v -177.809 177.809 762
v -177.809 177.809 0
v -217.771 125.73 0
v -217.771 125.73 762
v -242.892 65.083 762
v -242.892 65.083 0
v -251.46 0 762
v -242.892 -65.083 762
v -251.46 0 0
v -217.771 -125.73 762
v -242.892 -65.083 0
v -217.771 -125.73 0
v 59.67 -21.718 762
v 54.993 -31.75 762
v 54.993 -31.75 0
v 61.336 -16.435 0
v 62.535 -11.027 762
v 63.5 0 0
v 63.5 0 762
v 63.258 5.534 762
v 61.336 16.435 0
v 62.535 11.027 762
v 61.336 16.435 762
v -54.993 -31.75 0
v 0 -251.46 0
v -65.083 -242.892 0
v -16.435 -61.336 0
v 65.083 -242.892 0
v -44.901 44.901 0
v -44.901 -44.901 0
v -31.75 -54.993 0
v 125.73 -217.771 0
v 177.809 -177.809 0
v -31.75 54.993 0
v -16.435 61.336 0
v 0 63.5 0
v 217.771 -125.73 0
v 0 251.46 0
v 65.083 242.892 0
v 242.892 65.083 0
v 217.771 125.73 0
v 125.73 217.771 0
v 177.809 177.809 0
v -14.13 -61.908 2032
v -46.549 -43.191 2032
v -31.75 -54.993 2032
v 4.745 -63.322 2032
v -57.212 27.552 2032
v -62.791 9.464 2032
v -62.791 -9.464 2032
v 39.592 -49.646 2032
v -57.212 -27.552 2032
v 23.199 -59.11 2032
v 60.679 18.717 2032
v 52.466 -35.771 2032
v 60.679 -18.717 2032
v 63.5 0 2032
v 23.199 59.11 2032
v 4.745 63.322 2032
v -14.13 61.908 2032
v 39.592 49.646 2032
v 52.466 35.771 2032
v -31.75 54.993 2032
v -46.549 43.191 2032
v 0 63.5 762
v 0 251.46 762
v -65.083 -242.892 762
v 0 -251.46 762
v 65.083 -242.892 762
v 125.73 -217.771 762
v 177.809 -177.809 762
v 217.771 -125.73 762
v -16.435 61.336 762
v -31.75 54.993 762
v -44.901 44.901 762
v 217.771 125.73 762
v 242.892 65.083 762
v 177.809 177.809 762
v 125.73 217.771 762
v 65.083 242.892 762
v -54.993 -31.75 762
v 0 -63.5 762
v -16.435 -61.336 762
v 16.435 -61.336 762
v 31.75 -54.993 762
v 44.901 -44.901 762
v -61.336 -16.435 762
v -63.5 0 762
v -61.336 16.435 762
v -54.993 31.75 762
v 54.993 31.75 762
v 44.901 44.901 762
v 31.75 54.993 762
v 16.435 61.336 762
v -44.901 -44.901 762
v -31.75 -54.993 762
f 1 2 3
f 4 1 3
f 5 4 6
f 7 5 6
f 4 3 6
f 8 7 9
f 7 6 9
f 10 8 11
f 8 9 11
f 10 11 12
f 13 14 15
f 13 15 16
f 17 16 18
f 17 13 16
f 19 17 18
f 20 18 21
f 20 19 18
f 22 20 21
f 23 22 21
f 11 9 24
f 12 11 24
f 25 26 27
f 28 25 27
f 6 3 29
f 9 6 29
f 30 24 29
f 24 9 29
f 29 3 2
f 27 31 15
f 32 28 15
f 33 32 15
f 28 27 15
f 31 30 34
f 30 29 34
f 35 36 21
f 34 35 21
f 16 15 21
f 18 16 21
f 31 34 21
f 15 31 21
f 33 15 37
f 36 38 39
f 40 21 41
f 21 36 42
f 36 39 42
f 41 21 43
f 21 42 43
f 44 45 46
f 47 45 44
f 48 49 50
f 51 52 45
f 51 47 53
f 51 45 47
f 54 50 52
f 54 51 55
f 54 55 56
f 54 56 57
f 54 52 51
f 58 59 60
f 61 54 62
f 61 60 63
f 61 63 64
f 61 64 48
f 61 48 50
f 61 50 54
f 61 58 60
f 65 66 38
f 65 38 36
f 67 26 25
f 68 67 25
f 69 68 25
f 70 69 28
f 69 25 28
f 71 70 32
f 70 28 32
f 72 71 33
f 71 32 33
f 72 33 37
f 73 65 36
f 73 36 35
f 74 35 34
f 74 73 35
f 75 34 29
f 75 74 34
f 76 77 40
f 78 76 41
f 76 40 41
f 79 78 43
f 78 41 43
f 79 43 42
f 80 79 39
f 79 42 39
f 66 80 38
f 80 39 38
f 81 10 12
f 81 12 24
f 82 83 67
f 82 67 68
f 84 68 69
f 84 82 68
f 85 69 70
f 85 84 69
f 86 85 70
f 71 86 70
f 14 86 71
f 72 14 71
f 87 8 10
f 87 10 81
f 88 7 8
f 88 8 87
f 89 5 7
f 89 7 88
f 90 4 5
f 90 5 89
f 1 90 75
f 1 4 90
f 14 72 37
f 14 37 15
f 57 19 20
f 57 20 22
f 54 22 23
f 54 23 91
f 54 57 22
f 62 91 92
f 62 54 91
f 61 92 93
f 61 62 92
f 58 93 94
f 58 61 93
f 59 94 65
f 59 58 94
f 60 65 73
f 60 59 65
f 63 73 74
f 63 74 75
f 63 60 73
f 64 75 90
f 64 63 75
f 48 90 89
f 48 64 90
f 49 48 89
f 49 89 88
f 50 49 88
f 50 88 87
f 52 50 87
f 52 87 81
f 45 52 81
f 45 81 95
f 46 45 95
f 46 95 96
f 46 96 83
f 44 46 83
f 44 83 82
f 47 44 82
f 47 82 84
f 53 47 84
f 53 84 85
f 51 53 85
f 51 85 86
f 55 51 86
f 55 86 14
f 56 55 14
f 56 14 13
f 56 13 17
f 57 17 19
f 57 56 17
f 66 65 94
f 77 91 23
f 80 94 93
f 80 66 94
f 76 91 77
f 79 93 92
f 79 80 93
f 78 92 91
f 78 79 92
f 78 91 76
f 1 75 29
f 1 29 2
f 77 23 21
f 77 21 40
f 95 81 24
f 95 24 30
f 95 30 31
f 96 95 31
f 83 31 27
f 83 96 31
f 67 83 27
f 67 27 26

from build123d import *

# Parameters (mm, degrees)
SKETCH1_R           = 251.46
BOSS_EXTRUDE1_DEPTH = 762
CUT_EXTRUDE1_DEPTH  = 841.897296464
BOSS_EXTRUDE2_START = 1270
SKETCH3_R           = 63.5
BOSS_EXTRUDE2_DEPTH = 1270


with BuildPart() as part:
    # Sketch1 → Boss-Extrude1 (new body)
    with BuildSketch(Plane.XY):
        Circle(SKETCH1_R)
    extrude(amount=BOSS_EXTRUDE1_DEPTH)

    # Sketch2 → Cut-Extrude1 (cut, through all)
    with BuildSketch(Plane.XY.offset(762)):
        with BuildLine():
            Line((-44.901280605, 44.901280605), (-177.809071197, 177.809071197))
            ThreePointArc((-177.809071197, 177.809071197), (-96.229575903, 232.318747245), (0, 251.46))
            Line((0, 251.46), (0, 63.5))
            ThreePointArc((0, 63.5), (-24.300397955, 58.666350314), (-44.901280605, 44.901280605))
        make_face()
        with BuildLine():
            Line((61.336289969, 16.435009364), (242.891708279, 65.082637081))
            ThreePointArc((242.891708279, 65.082637081), (249.308724841, -32.822116296), (217.770748036, -125.73))
            Line((217.770748036, -125.73), (54.99261314, -31.75))
            ThreePointArc((54.99261314, -31.75), (62.956748697, -8.288413206), (61.336289969, 16.435009364))
        make_face()
        with BuildLine():
            Line((-16.435009364, -61.336289969), (-65.082637081, -242.891708279))
            ThreePointArc((-65.082637081, -242.891708279), (-153.079148939, -199.49663095), (-217.770748036, -125.73))
            Line((-217.770748036, -125.73), (-54.99261314, -31.75))
            ThreePointArc((-54.99261314, -31.75), (-38.656350742, -50.377937108), (-16.435009364, -61.336289969))
        make_face()
    extrude(amount=-CUT_EXTRUDE1_DEPTH, mode=Mode.SUBTRACT)

    # Sketch3 → Boss-Extrude2 (add)
    with BuildSketch(Plane.XY.offset(762).offset(BOSS_EXTRUDE2_START)):
        Circle(SKETCH3_R)
    extrude(amount=-BOSS_EXTRUDE2_DEPTH)


solid = part.part
